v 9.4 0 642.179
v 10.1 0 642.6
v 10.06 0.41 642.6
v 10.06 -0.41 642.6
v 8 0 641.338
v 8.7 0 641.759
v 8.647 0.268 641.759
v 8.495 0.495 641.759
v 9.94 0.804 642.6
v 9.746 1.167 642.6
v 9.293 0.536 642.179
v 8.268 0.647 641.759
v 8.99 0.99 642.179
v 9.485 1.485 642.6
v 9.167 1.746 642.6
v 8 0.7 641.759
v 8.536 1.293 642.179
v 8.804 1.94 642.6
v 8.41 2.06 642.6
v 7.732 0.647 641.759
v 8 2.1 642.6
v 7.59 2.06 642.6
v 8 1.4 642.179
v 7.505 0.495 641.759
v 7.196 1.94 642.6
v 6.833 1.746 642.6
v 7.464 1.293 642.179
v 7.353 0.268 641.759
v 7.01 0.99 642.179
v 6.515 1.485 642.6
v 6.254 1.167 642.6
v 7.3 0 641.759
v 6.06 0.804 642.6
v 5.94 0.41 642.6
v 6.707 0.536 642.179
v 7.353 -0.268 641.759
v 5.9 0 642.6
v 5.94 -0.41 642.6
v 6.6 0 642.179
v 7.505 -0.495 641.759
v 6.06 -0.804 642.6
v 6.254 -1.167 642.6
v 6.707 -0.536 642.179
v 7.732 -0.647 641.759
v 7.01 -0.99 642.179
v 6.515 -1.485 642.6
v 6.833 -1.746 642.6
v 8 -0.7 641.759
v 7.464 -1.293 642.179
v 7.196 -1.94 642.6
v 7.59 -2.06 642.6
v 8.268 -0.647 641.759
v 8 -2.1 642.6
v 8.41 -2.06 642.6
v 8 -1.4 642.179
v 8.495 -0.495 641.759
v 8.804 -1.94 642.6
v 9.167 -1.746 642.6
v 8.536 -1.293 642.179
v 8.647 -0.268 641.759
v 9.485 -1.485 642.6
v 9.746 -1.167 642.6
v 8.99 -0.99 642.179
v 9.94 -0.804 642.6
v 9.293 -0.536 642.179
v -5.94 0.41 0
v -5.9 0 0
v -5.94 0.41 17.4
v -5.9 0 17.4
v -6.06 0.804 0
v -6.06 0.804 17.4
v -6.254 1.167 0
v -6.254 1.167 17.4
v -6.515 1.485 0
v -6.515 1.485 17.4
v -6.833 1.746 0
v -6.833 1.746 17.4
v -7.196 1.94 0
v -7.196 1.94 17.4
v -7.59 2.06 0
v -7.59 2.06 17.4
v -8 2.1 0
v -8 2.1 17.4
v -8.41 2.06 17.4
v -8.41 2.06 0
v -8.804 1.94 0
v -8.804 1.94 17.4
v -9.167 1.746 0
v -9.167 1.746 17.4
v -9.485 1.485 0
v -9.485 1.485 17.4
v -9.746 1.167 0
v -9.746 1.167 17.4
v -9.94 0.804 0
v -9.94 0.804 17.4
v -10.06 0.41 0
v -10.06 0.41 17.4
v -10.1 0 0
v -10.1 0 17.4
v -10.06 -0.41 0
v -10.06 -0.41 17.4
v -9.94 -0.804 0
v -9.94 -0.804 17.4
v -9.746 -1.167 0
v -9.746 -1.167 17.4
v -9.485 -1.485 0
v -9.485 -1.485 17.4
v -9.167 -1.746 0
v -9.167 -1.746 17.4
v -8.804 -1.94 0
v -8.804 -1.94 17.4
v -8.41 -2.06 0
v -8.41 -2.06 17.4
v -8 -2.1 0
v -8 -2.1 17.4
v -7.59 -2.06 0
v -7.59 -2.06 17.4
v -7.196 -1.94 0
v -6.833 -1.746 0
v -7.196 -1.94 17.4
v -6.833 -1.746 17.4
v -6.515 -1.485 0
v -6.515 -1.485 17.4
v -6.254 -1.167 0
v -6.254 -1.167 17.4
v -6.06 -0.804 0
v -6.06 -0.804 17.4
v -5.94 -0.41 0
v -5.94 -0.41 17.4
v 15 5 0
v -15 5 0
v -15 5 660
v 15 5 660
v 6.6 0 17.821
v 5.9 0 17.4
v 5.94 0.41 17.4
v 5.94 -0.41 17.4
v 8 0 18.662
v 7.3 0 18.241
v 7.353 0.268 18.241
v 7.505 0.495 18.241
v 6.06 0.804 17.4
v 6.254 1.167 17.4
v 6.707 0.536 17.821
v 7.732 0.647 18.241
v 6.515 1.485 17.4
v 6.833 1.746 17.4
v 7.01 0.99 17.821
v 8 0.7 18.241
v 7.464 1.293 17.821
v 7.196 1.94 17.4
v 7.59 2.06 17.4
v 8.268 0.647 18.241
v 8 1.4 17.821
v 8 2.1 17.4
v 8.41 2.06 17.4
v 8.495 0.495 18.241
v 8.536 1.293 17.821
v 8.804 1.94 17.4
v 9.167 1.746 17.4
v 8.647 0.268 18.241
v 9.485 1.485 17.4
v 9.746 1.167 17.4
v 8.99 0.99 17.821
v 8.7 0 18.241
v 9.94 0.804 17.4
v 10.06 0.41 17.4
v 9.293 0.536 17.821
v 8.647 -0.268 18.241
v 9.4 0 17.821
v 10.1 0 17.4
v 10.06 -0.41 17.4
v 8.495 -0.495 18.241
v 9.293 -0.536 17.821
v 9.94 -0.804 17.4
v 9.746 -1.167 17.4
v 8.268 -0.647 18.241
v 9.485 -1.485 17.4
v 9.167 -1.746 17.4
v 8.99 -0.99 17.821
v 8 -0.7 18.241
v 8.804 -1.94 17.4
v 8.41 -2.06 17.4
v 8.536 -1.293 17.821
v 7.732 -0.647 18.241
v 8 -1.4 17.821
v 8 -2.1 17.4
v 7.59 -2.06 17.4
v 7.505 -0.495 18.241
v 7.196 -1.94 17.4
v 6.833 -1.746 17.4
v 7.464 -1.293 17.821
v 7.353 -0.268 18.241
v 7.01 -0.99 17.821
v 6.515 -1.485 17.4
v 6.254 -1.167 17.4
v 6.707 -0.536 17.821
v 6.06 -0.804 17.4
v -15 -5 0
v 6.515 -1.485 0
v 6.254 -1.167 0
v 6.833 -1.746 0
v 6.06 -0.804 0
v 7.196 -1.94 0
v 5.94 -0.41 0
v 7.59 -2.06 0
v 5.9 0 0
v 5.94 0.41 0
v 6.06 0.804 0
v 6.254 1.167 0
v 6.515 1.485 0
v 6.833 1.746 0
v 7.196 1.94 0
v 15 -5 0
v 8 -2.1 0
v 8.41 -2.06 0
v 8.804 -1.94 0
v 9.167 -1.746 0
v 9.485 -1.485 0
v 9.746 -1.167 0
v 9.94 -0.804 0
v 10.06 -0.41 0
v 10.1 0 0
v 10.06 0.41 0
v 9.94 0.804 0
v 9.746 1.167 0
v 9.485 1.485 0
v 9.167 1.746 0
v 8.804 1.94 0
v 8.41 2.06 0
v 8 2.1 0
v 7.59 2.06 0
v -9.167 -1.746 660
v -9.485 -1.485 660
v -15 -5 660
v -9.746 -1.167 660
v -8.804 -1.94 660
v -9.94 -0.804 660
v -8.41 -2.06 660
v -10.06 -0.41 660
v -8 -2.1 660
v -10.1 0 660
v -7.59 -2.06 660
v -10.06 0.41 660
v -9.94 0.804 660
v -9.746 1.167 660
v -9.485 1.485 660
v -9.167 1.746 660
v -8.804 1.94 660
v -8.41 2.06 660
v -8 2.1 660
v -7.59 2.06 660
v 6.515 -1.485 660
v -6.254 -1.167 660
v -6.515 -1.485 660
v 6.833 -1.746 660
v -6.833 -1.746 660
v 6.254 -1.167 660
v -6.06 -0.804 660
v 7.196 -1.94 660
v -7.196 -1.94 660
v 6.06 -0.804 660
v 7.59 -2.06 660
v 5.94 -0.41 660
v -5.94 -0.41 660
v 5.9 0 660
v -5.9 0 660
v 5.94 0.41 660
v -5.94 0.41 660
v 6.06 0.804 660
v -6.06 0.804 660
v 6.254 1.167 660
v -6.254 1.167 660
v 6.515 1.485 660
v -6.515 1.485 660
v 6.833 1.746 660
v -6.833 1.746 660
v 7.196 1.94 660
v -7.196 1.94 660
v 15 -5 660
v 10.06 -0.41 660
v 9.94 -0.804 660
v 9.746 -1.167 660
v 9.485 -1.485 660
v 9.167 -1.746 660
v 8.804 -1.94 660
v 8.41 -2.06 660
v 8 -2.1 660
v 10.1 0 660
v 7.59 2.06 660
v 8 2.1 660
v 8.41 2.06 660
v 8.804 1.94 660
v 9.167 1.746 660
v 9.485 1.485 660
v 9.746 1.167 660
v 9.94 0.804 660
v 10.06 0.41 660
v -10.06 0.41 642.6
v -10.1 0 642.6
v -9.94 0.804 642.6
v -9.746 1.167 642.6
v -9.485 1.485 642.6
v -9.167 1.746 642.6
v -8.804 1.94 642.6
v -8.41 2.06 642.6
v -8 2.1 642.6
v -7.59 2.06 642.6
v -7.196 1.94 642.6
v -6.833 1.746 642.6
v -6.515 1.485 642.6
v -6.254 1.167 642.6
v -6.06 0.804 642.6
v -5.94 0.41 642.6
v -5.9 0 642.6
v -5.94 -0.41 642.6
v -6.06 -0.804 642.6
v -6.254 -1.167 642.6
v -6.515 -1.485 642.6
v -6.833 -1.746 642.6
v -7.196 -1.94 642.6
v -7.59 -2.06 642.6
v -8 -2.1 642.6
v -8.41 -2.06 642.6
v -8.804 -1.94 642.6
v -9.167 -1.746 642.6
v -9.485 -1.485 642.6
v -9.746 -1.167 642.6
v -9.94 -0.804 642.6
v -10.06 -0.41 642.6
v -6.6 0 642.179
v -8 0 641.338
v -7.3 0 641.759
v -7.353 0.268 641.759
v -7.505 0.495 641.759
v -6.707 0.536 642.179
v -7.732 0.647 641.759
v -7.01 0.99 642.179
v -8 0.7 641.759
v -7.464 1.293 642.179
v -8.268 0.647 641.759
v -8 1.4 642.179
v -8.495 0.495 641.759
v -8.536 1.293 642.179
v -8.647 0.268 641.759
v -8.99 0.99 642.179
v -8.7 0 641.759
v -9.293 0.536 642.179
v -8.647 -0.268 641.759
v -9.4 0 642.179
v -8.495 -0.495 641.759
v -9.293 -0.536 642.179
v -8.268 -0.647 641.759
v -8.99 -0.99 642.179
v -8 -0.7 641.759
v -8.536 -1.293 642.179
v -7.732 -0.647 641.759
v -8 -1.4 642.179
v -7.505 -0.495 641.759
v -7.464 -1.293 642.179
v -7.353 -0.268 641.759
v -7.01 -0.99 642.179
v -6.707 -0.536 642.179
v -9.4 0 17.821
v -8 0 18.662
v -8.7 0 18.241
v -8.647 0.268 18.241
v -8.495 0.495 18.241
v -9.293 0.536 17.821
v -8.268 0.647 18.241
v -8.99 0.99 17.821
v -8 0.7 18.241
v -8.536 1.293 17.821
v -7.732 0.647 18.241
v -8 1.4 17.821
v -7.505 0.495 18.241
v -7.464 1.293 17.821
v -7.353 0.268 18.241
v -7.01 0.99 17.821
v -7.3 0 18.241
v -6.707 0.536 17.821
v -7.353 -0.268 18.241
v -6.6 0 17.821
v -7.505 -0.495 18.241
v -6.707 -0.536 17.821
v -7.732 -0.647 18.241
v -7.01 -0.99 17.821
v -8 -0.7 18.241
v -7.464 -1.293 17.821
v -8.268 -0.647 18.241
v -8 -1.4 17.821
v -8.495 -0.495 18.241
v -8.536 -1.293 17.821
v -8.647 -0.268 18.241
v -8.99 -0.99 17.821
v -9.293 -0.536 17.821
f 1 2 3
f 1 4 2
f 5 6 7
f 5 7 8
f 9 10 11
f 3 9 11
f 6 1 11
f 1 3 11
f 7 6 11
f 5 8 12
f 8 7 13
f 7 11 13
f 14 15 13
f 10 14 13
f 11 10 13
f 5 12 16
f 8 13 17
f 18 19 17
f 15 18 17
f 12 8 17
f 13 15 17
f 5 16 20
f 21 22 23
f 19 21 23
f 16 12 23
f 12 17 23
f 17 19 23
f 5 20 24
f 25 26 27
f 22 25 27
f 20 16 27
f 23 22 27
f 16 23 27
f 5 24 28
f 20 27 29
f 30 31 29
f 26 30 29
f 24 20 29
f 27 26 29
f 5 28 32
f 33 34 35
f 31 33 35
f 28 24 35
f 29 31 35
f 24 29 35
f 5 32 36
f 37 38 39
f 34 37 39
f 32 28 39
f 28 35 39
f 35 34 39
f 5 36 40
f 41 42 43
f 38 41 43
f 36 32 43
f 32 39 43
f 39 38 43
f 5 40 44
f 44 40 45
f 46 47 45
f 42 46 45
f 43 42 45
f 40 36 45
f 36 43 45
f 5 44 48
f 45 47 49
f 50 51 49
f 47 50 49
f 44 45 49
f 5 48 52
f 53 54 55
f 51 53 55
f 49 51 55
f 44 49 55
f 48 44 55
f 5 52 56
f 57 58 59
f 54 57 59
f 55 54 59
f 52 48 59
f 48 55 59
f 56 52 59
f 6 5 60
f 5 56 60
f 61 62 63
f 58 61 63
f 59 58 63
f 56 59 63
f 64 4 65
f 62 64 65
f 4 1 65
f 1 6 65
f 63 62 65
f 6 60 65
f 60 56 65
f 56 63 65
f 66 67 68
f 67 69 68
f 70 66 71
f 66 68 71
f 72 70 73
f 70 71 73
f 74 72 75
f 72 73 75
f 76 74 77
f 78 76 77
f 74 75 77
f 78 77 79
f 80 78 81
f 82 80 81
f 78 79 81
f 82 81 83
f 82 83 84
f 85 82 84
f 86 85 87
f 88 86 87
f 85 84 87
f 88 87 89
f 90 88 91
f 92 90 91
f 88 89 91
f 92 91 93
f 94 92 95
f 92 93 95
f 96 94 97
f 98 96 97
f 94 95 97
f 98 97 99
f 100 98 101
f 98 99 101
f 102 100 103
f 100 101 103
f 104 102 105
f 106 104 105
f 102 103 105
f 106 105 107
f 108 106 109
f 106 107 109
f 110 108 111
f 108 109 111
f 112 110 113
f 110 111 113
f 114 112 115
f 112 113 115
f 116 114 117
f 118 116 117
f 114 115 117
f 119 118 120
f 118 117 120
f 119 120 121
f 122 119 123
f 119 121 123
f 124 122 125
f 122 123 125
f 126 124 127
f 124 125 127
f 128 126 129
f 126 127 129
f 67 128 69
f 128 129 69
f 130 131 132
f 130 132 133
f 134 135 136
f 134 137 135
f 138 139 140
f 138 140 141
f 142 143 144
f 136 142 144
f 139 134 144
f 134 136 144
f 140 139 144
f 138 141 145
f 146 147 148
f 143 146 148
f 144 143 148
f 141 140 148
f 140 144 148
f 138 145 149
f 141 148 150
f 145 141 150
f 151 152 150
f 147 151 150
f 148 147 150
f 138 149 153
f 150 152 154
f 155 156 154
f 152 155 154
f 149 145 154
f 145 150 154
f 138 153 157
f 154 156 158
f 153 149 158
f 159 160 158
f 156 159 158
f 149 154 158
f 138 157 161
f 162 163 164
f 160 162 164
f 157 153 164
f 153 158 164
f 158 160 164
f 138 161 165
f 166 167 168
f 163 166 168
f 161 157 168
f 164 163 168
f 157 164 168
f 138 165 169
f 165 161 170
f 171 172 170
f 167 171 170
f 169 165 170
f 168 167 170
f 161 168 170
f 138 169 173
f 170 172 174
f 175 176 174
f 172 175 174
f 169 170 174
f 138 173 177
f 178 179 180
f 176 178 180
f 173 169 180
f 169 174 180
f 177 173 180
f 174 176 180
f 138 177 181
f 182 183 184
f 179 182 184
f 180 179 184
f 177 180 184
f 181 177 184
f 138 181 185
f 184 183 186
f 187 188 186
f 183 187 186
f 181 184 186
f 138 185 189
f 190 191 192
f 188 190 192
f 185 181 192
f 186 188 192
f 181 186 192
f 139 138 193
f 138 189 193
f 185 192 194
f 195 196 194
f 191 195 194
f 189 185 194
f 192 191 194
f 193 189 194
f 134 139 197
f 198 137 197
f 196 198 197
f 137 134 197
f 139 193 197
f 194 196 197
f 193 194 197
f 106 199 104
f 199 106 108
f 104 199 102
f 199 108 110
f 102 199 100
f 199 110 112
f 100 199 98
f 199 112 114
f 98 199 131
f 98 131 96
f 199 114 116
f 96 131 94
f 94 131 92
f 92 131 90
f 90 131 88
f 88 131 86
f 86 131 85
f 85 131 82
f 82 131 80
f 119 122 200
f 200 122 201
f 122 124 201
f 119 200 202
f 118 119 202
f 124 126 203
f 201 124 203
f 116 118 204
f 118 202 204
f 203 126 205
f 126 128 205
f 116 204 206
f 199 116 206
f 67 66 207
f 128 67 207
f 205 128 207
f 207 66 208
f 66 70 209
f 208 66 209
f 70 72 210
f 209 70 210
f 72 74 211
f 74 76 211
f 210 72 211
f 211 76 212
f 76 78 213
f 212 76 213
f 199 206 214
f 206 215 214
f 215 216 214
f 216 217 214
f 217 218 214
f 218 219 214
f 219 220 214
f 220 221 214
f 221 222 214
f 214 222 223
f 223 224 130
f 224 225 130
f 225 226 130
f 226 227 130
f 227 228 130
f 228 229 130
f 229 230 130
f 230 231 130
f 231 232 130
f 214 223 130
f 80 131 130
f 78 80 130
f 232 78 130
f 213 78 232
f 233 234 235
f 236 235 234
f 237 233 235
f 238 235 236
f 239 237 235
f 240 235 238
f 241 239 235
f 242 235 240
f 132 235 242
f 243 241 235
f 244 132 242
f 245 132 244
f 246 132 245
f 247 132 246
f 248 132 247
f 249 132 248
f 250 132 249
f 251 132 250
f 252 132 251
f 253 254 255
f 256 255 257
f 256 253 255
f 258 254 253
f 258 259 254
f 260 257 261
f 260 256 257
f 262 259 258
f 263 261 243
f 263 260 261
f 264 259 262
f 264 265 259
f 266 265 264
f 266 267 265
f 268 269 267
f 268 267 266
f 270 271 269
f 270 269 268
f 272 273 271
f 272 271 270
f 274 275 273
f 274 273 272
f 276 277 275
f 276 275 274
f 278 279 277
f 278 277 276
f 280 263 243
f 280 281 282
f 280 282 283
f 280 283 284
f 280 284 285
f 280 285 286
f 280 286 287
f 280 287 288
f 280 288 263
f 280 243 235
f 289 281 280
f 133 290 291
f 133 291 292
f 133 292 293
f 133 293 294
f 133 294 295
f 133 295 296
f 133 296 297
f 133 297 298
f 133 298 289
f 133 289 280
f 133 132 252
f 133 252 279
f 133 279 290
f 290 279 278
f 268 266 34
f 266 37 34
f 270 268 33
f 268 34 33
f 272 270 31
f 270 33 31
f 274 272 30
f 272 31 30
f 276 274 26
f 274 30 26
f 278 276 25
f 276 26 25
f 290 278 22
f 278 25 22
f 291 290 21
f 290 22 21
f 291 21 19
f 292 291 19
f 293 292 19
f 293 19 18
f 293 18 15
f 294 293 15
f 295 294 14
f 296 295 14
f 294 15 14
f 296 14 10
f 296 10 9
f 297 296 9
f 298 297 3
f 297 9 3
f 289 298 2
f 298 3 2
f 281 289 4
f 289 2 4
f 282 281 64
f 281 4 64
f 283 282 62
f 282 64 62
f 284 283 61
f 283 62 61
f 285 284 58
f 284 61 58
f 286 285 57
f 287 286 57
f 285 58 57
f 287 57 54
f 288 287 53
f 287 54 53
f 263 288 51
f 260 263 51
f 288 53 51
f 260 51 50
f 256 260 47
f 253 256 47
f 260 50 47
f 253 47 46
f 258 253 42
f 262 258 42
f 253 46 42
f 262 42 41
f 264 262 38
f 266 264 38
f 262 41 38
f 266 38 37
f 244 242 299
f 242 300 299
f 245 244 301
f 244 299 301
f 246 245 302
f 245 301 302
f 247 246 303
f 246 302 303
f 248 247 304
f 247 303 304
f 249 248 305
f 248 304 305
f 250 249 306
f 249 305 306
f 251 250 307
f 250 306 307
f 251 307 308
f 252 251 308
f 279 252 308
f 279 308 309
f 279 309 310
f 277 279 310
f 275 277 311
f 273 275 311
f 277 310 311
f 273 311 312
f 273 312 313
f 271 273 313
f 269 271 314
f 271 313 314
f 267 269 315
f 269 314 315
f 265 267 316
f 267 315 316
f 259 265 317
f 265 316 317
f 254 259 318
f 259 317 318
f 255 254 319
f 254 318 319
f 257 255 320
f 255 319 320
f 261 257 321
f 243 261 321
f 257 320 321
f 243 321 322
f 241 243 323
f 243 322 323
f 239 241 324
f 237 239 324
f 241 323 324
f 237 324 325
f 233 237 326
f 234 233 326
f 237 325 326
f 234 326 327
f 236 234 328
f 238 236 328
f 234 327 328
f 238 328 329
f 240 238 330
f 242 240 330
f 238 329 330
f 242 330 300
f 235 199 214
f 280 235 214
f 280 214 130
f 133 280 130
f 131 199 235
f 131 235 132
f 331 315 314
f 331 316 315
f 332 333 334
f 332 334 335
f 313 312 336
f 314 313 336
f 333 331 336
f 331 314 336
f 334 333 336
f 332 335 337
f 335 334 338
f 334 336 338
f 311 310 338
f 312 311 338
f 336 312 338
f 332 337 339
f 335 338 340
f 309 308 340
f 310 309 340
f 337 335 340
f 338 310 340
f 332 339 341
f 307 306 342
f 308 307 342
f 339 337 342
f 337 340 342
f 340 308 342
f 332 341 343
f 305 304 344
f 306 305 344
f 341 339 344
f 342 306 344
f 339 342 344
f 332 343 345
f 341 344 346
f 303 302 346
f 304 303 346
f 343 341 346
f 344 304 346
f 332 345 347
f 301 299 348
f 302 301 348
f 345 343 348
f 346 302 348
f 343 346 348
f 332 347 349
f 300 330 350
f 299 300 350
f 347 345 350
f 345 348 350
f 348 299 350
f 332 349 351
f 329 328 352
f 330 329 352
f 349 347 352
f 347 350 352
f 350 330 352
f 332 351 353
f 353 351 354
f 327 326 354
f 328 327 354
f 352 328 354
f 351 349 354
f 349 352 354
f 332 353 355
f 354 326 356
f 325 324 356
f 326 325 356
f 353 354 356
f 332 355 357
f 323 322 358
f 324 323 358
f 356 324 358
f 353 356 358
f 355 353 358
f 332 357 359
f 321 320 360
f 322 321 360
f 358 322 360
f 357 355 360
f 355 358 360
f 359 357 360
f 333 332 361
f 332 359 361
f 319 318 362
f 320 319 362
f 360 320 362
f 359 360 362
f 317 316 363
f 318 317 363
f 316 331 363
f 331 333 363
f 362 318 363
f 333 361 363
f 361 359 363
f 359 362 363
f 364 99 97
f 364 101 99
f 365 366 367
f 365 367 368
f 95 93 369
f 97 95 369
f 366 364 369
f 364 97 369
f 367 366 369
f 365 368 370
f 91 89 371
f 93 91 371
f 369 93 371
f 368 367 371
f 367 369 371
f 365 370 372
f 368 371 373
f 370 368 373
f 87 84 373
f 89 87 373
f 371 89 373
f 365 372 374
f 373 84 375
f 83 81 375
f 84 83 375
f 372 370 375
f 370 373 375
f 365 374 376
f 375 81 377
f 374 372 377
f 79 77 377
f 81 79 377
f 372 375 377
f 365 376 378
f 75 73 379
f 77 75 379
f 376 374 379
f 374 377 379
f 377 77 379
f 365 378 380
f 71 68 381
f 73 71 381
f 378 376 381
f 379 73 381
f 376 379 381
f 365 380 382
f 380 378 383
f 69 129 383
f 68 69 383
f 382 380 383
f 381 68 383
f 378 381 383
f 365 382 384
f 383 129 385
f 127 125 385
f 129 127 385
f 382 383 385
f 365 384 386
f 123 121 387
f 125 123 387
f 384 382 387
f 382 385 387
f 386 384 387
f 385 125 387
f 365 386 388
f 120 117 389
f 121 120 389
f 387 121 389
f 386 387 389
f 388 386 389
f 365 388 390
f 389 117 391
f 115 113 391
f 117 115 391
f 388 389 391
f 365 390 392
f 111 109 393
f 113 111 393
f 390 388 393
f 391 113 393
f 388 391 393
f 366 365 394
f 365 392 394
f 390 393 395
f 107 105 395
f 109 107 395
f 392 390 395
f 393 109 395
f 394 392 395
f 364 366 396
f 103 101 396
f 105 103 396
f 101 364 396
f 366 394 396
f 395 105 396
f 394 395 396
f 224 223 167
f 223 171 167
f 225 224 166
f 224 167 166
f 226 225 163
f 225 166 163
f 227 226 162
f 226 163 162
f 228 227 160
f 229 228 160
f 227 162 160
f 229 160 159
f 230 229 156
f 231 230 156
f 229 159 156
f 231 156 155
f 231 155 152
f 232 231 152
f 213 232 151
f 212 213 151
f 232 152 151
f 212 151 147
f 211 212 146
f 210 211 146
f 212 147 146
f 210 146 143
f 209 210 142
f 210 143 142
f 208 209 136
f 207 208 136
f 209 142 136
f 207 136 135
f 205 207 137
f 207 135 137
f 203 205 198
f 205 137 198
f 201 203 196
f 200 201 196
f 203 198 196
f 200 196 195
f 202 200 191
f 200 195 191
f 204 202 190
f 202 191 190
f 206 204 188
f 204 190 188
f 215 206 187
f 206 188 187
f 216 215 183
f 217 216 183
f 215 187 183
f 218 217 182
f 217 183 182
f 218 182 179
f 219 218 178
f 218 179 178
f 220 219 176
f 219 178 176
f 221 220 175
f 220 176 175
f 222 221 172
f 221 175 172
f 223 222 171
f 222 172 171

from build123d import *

# Parameters (mm, degrees)
SKETCH1_W             = 30
SKETCH1_H             = 10
BOSS_EXTRUDE1_DEPTH   = 660
M5_TAPPED_HOLE1_D     = 4.2
M5_TAPPED_HOLE1_DEPTH = 17.4
M5_TAPPED_HOLE1_TIP   = 1.2618073
M5_TAPPED_HOLE2_D     = 4.2
M5_TAPPED_HOLE2_DEPTH = 17.4
M5_TAPPED_HOLE2_TIP   = 1.2618073
M5_TAPPED_HOLE3_D     = 4.2
M5_TAPPED_HOLE3_DEPTH = 17.4
M5_TAPPED_HOLE3_TIP   = 1.2618073


with BuildPart() as part:
    # Sketch1 → Boss-Extrude1 (new body)
    with BuildSketch(Plane.XY):
        Rectangle(SKETCH1_W, SKETCH1_H)
    extrude(amount=BOSS_EXTRUDE1_DEPTH)

    # M5 Tapped Hole1
    with Locations(Plane(origin=(-8, 0, 0), x_dir=(-1, 0, 0), z_dir=(0, 0, -1))):
        with Locations((0, 0), (-16, 0)):
            Hole(M5_TAPPED_HOLE1_D / 2, depth=M5_TAPPED_HOLE1_DEPTH)
            with Locations((0, 0, -(M5_TAPPED_HOLE1_DEPTH + M5_TAPPED_HOLE1_TIP / 2))):  # 118° drill point
                Cone(0, M5_TAPPED_HOLE1_D / 2, M5_TAPPED_HOLE1_TIP, mode=Mode.SUBTRACT)

    # M5 Tapped Hole2
    with Locations(Plane(origin=(-8, 0, 0), x_dir=(-1, 0, 0), z_dir=(0, 0, -1))):
        with Locations((0, 0), (-16, 0)):
            Hole(M5_TAPPED_HOLE2_D / 2, depth=M5_TAPPED_HOLE2_DEPTH)
            with Locations((0, 0, -(M5_TAPPED_HOLE2_DEPTH + M5_TAPPED_HOLE2_TIP / 2))):  # 118° drill point
                Cone(0, M5_TAPPED_HOLE2_D / 2, M5_TAPPED_HOLE2_TIP, mode=Mode.SUBTRACT)

    # M5 Tapped Hole3
    with Locations(Plane(origin=(-8, 0, 660), x_dir=(1, 0, 0), z_dir=(0, 0, 1))):
        with Locations((0, 0), (16, 0)):
            Hole(M5_TAPPED_HOLE3_D / 2, depth=M5_TAPPED_HOLE3_DEPTH)
            with Locations((0, 0, -(M5_TAPPED_HOLE3_DEPTH + M5_TAPPED_HOLE3_TIP / 2))):  # 118° drill point
                Cone(0, M5_TAPPED_HOLE3_D / 2, M5_TAPPED_HOLE3_TIP, mode=Mode.SUBTRACT)


solid = part.part
